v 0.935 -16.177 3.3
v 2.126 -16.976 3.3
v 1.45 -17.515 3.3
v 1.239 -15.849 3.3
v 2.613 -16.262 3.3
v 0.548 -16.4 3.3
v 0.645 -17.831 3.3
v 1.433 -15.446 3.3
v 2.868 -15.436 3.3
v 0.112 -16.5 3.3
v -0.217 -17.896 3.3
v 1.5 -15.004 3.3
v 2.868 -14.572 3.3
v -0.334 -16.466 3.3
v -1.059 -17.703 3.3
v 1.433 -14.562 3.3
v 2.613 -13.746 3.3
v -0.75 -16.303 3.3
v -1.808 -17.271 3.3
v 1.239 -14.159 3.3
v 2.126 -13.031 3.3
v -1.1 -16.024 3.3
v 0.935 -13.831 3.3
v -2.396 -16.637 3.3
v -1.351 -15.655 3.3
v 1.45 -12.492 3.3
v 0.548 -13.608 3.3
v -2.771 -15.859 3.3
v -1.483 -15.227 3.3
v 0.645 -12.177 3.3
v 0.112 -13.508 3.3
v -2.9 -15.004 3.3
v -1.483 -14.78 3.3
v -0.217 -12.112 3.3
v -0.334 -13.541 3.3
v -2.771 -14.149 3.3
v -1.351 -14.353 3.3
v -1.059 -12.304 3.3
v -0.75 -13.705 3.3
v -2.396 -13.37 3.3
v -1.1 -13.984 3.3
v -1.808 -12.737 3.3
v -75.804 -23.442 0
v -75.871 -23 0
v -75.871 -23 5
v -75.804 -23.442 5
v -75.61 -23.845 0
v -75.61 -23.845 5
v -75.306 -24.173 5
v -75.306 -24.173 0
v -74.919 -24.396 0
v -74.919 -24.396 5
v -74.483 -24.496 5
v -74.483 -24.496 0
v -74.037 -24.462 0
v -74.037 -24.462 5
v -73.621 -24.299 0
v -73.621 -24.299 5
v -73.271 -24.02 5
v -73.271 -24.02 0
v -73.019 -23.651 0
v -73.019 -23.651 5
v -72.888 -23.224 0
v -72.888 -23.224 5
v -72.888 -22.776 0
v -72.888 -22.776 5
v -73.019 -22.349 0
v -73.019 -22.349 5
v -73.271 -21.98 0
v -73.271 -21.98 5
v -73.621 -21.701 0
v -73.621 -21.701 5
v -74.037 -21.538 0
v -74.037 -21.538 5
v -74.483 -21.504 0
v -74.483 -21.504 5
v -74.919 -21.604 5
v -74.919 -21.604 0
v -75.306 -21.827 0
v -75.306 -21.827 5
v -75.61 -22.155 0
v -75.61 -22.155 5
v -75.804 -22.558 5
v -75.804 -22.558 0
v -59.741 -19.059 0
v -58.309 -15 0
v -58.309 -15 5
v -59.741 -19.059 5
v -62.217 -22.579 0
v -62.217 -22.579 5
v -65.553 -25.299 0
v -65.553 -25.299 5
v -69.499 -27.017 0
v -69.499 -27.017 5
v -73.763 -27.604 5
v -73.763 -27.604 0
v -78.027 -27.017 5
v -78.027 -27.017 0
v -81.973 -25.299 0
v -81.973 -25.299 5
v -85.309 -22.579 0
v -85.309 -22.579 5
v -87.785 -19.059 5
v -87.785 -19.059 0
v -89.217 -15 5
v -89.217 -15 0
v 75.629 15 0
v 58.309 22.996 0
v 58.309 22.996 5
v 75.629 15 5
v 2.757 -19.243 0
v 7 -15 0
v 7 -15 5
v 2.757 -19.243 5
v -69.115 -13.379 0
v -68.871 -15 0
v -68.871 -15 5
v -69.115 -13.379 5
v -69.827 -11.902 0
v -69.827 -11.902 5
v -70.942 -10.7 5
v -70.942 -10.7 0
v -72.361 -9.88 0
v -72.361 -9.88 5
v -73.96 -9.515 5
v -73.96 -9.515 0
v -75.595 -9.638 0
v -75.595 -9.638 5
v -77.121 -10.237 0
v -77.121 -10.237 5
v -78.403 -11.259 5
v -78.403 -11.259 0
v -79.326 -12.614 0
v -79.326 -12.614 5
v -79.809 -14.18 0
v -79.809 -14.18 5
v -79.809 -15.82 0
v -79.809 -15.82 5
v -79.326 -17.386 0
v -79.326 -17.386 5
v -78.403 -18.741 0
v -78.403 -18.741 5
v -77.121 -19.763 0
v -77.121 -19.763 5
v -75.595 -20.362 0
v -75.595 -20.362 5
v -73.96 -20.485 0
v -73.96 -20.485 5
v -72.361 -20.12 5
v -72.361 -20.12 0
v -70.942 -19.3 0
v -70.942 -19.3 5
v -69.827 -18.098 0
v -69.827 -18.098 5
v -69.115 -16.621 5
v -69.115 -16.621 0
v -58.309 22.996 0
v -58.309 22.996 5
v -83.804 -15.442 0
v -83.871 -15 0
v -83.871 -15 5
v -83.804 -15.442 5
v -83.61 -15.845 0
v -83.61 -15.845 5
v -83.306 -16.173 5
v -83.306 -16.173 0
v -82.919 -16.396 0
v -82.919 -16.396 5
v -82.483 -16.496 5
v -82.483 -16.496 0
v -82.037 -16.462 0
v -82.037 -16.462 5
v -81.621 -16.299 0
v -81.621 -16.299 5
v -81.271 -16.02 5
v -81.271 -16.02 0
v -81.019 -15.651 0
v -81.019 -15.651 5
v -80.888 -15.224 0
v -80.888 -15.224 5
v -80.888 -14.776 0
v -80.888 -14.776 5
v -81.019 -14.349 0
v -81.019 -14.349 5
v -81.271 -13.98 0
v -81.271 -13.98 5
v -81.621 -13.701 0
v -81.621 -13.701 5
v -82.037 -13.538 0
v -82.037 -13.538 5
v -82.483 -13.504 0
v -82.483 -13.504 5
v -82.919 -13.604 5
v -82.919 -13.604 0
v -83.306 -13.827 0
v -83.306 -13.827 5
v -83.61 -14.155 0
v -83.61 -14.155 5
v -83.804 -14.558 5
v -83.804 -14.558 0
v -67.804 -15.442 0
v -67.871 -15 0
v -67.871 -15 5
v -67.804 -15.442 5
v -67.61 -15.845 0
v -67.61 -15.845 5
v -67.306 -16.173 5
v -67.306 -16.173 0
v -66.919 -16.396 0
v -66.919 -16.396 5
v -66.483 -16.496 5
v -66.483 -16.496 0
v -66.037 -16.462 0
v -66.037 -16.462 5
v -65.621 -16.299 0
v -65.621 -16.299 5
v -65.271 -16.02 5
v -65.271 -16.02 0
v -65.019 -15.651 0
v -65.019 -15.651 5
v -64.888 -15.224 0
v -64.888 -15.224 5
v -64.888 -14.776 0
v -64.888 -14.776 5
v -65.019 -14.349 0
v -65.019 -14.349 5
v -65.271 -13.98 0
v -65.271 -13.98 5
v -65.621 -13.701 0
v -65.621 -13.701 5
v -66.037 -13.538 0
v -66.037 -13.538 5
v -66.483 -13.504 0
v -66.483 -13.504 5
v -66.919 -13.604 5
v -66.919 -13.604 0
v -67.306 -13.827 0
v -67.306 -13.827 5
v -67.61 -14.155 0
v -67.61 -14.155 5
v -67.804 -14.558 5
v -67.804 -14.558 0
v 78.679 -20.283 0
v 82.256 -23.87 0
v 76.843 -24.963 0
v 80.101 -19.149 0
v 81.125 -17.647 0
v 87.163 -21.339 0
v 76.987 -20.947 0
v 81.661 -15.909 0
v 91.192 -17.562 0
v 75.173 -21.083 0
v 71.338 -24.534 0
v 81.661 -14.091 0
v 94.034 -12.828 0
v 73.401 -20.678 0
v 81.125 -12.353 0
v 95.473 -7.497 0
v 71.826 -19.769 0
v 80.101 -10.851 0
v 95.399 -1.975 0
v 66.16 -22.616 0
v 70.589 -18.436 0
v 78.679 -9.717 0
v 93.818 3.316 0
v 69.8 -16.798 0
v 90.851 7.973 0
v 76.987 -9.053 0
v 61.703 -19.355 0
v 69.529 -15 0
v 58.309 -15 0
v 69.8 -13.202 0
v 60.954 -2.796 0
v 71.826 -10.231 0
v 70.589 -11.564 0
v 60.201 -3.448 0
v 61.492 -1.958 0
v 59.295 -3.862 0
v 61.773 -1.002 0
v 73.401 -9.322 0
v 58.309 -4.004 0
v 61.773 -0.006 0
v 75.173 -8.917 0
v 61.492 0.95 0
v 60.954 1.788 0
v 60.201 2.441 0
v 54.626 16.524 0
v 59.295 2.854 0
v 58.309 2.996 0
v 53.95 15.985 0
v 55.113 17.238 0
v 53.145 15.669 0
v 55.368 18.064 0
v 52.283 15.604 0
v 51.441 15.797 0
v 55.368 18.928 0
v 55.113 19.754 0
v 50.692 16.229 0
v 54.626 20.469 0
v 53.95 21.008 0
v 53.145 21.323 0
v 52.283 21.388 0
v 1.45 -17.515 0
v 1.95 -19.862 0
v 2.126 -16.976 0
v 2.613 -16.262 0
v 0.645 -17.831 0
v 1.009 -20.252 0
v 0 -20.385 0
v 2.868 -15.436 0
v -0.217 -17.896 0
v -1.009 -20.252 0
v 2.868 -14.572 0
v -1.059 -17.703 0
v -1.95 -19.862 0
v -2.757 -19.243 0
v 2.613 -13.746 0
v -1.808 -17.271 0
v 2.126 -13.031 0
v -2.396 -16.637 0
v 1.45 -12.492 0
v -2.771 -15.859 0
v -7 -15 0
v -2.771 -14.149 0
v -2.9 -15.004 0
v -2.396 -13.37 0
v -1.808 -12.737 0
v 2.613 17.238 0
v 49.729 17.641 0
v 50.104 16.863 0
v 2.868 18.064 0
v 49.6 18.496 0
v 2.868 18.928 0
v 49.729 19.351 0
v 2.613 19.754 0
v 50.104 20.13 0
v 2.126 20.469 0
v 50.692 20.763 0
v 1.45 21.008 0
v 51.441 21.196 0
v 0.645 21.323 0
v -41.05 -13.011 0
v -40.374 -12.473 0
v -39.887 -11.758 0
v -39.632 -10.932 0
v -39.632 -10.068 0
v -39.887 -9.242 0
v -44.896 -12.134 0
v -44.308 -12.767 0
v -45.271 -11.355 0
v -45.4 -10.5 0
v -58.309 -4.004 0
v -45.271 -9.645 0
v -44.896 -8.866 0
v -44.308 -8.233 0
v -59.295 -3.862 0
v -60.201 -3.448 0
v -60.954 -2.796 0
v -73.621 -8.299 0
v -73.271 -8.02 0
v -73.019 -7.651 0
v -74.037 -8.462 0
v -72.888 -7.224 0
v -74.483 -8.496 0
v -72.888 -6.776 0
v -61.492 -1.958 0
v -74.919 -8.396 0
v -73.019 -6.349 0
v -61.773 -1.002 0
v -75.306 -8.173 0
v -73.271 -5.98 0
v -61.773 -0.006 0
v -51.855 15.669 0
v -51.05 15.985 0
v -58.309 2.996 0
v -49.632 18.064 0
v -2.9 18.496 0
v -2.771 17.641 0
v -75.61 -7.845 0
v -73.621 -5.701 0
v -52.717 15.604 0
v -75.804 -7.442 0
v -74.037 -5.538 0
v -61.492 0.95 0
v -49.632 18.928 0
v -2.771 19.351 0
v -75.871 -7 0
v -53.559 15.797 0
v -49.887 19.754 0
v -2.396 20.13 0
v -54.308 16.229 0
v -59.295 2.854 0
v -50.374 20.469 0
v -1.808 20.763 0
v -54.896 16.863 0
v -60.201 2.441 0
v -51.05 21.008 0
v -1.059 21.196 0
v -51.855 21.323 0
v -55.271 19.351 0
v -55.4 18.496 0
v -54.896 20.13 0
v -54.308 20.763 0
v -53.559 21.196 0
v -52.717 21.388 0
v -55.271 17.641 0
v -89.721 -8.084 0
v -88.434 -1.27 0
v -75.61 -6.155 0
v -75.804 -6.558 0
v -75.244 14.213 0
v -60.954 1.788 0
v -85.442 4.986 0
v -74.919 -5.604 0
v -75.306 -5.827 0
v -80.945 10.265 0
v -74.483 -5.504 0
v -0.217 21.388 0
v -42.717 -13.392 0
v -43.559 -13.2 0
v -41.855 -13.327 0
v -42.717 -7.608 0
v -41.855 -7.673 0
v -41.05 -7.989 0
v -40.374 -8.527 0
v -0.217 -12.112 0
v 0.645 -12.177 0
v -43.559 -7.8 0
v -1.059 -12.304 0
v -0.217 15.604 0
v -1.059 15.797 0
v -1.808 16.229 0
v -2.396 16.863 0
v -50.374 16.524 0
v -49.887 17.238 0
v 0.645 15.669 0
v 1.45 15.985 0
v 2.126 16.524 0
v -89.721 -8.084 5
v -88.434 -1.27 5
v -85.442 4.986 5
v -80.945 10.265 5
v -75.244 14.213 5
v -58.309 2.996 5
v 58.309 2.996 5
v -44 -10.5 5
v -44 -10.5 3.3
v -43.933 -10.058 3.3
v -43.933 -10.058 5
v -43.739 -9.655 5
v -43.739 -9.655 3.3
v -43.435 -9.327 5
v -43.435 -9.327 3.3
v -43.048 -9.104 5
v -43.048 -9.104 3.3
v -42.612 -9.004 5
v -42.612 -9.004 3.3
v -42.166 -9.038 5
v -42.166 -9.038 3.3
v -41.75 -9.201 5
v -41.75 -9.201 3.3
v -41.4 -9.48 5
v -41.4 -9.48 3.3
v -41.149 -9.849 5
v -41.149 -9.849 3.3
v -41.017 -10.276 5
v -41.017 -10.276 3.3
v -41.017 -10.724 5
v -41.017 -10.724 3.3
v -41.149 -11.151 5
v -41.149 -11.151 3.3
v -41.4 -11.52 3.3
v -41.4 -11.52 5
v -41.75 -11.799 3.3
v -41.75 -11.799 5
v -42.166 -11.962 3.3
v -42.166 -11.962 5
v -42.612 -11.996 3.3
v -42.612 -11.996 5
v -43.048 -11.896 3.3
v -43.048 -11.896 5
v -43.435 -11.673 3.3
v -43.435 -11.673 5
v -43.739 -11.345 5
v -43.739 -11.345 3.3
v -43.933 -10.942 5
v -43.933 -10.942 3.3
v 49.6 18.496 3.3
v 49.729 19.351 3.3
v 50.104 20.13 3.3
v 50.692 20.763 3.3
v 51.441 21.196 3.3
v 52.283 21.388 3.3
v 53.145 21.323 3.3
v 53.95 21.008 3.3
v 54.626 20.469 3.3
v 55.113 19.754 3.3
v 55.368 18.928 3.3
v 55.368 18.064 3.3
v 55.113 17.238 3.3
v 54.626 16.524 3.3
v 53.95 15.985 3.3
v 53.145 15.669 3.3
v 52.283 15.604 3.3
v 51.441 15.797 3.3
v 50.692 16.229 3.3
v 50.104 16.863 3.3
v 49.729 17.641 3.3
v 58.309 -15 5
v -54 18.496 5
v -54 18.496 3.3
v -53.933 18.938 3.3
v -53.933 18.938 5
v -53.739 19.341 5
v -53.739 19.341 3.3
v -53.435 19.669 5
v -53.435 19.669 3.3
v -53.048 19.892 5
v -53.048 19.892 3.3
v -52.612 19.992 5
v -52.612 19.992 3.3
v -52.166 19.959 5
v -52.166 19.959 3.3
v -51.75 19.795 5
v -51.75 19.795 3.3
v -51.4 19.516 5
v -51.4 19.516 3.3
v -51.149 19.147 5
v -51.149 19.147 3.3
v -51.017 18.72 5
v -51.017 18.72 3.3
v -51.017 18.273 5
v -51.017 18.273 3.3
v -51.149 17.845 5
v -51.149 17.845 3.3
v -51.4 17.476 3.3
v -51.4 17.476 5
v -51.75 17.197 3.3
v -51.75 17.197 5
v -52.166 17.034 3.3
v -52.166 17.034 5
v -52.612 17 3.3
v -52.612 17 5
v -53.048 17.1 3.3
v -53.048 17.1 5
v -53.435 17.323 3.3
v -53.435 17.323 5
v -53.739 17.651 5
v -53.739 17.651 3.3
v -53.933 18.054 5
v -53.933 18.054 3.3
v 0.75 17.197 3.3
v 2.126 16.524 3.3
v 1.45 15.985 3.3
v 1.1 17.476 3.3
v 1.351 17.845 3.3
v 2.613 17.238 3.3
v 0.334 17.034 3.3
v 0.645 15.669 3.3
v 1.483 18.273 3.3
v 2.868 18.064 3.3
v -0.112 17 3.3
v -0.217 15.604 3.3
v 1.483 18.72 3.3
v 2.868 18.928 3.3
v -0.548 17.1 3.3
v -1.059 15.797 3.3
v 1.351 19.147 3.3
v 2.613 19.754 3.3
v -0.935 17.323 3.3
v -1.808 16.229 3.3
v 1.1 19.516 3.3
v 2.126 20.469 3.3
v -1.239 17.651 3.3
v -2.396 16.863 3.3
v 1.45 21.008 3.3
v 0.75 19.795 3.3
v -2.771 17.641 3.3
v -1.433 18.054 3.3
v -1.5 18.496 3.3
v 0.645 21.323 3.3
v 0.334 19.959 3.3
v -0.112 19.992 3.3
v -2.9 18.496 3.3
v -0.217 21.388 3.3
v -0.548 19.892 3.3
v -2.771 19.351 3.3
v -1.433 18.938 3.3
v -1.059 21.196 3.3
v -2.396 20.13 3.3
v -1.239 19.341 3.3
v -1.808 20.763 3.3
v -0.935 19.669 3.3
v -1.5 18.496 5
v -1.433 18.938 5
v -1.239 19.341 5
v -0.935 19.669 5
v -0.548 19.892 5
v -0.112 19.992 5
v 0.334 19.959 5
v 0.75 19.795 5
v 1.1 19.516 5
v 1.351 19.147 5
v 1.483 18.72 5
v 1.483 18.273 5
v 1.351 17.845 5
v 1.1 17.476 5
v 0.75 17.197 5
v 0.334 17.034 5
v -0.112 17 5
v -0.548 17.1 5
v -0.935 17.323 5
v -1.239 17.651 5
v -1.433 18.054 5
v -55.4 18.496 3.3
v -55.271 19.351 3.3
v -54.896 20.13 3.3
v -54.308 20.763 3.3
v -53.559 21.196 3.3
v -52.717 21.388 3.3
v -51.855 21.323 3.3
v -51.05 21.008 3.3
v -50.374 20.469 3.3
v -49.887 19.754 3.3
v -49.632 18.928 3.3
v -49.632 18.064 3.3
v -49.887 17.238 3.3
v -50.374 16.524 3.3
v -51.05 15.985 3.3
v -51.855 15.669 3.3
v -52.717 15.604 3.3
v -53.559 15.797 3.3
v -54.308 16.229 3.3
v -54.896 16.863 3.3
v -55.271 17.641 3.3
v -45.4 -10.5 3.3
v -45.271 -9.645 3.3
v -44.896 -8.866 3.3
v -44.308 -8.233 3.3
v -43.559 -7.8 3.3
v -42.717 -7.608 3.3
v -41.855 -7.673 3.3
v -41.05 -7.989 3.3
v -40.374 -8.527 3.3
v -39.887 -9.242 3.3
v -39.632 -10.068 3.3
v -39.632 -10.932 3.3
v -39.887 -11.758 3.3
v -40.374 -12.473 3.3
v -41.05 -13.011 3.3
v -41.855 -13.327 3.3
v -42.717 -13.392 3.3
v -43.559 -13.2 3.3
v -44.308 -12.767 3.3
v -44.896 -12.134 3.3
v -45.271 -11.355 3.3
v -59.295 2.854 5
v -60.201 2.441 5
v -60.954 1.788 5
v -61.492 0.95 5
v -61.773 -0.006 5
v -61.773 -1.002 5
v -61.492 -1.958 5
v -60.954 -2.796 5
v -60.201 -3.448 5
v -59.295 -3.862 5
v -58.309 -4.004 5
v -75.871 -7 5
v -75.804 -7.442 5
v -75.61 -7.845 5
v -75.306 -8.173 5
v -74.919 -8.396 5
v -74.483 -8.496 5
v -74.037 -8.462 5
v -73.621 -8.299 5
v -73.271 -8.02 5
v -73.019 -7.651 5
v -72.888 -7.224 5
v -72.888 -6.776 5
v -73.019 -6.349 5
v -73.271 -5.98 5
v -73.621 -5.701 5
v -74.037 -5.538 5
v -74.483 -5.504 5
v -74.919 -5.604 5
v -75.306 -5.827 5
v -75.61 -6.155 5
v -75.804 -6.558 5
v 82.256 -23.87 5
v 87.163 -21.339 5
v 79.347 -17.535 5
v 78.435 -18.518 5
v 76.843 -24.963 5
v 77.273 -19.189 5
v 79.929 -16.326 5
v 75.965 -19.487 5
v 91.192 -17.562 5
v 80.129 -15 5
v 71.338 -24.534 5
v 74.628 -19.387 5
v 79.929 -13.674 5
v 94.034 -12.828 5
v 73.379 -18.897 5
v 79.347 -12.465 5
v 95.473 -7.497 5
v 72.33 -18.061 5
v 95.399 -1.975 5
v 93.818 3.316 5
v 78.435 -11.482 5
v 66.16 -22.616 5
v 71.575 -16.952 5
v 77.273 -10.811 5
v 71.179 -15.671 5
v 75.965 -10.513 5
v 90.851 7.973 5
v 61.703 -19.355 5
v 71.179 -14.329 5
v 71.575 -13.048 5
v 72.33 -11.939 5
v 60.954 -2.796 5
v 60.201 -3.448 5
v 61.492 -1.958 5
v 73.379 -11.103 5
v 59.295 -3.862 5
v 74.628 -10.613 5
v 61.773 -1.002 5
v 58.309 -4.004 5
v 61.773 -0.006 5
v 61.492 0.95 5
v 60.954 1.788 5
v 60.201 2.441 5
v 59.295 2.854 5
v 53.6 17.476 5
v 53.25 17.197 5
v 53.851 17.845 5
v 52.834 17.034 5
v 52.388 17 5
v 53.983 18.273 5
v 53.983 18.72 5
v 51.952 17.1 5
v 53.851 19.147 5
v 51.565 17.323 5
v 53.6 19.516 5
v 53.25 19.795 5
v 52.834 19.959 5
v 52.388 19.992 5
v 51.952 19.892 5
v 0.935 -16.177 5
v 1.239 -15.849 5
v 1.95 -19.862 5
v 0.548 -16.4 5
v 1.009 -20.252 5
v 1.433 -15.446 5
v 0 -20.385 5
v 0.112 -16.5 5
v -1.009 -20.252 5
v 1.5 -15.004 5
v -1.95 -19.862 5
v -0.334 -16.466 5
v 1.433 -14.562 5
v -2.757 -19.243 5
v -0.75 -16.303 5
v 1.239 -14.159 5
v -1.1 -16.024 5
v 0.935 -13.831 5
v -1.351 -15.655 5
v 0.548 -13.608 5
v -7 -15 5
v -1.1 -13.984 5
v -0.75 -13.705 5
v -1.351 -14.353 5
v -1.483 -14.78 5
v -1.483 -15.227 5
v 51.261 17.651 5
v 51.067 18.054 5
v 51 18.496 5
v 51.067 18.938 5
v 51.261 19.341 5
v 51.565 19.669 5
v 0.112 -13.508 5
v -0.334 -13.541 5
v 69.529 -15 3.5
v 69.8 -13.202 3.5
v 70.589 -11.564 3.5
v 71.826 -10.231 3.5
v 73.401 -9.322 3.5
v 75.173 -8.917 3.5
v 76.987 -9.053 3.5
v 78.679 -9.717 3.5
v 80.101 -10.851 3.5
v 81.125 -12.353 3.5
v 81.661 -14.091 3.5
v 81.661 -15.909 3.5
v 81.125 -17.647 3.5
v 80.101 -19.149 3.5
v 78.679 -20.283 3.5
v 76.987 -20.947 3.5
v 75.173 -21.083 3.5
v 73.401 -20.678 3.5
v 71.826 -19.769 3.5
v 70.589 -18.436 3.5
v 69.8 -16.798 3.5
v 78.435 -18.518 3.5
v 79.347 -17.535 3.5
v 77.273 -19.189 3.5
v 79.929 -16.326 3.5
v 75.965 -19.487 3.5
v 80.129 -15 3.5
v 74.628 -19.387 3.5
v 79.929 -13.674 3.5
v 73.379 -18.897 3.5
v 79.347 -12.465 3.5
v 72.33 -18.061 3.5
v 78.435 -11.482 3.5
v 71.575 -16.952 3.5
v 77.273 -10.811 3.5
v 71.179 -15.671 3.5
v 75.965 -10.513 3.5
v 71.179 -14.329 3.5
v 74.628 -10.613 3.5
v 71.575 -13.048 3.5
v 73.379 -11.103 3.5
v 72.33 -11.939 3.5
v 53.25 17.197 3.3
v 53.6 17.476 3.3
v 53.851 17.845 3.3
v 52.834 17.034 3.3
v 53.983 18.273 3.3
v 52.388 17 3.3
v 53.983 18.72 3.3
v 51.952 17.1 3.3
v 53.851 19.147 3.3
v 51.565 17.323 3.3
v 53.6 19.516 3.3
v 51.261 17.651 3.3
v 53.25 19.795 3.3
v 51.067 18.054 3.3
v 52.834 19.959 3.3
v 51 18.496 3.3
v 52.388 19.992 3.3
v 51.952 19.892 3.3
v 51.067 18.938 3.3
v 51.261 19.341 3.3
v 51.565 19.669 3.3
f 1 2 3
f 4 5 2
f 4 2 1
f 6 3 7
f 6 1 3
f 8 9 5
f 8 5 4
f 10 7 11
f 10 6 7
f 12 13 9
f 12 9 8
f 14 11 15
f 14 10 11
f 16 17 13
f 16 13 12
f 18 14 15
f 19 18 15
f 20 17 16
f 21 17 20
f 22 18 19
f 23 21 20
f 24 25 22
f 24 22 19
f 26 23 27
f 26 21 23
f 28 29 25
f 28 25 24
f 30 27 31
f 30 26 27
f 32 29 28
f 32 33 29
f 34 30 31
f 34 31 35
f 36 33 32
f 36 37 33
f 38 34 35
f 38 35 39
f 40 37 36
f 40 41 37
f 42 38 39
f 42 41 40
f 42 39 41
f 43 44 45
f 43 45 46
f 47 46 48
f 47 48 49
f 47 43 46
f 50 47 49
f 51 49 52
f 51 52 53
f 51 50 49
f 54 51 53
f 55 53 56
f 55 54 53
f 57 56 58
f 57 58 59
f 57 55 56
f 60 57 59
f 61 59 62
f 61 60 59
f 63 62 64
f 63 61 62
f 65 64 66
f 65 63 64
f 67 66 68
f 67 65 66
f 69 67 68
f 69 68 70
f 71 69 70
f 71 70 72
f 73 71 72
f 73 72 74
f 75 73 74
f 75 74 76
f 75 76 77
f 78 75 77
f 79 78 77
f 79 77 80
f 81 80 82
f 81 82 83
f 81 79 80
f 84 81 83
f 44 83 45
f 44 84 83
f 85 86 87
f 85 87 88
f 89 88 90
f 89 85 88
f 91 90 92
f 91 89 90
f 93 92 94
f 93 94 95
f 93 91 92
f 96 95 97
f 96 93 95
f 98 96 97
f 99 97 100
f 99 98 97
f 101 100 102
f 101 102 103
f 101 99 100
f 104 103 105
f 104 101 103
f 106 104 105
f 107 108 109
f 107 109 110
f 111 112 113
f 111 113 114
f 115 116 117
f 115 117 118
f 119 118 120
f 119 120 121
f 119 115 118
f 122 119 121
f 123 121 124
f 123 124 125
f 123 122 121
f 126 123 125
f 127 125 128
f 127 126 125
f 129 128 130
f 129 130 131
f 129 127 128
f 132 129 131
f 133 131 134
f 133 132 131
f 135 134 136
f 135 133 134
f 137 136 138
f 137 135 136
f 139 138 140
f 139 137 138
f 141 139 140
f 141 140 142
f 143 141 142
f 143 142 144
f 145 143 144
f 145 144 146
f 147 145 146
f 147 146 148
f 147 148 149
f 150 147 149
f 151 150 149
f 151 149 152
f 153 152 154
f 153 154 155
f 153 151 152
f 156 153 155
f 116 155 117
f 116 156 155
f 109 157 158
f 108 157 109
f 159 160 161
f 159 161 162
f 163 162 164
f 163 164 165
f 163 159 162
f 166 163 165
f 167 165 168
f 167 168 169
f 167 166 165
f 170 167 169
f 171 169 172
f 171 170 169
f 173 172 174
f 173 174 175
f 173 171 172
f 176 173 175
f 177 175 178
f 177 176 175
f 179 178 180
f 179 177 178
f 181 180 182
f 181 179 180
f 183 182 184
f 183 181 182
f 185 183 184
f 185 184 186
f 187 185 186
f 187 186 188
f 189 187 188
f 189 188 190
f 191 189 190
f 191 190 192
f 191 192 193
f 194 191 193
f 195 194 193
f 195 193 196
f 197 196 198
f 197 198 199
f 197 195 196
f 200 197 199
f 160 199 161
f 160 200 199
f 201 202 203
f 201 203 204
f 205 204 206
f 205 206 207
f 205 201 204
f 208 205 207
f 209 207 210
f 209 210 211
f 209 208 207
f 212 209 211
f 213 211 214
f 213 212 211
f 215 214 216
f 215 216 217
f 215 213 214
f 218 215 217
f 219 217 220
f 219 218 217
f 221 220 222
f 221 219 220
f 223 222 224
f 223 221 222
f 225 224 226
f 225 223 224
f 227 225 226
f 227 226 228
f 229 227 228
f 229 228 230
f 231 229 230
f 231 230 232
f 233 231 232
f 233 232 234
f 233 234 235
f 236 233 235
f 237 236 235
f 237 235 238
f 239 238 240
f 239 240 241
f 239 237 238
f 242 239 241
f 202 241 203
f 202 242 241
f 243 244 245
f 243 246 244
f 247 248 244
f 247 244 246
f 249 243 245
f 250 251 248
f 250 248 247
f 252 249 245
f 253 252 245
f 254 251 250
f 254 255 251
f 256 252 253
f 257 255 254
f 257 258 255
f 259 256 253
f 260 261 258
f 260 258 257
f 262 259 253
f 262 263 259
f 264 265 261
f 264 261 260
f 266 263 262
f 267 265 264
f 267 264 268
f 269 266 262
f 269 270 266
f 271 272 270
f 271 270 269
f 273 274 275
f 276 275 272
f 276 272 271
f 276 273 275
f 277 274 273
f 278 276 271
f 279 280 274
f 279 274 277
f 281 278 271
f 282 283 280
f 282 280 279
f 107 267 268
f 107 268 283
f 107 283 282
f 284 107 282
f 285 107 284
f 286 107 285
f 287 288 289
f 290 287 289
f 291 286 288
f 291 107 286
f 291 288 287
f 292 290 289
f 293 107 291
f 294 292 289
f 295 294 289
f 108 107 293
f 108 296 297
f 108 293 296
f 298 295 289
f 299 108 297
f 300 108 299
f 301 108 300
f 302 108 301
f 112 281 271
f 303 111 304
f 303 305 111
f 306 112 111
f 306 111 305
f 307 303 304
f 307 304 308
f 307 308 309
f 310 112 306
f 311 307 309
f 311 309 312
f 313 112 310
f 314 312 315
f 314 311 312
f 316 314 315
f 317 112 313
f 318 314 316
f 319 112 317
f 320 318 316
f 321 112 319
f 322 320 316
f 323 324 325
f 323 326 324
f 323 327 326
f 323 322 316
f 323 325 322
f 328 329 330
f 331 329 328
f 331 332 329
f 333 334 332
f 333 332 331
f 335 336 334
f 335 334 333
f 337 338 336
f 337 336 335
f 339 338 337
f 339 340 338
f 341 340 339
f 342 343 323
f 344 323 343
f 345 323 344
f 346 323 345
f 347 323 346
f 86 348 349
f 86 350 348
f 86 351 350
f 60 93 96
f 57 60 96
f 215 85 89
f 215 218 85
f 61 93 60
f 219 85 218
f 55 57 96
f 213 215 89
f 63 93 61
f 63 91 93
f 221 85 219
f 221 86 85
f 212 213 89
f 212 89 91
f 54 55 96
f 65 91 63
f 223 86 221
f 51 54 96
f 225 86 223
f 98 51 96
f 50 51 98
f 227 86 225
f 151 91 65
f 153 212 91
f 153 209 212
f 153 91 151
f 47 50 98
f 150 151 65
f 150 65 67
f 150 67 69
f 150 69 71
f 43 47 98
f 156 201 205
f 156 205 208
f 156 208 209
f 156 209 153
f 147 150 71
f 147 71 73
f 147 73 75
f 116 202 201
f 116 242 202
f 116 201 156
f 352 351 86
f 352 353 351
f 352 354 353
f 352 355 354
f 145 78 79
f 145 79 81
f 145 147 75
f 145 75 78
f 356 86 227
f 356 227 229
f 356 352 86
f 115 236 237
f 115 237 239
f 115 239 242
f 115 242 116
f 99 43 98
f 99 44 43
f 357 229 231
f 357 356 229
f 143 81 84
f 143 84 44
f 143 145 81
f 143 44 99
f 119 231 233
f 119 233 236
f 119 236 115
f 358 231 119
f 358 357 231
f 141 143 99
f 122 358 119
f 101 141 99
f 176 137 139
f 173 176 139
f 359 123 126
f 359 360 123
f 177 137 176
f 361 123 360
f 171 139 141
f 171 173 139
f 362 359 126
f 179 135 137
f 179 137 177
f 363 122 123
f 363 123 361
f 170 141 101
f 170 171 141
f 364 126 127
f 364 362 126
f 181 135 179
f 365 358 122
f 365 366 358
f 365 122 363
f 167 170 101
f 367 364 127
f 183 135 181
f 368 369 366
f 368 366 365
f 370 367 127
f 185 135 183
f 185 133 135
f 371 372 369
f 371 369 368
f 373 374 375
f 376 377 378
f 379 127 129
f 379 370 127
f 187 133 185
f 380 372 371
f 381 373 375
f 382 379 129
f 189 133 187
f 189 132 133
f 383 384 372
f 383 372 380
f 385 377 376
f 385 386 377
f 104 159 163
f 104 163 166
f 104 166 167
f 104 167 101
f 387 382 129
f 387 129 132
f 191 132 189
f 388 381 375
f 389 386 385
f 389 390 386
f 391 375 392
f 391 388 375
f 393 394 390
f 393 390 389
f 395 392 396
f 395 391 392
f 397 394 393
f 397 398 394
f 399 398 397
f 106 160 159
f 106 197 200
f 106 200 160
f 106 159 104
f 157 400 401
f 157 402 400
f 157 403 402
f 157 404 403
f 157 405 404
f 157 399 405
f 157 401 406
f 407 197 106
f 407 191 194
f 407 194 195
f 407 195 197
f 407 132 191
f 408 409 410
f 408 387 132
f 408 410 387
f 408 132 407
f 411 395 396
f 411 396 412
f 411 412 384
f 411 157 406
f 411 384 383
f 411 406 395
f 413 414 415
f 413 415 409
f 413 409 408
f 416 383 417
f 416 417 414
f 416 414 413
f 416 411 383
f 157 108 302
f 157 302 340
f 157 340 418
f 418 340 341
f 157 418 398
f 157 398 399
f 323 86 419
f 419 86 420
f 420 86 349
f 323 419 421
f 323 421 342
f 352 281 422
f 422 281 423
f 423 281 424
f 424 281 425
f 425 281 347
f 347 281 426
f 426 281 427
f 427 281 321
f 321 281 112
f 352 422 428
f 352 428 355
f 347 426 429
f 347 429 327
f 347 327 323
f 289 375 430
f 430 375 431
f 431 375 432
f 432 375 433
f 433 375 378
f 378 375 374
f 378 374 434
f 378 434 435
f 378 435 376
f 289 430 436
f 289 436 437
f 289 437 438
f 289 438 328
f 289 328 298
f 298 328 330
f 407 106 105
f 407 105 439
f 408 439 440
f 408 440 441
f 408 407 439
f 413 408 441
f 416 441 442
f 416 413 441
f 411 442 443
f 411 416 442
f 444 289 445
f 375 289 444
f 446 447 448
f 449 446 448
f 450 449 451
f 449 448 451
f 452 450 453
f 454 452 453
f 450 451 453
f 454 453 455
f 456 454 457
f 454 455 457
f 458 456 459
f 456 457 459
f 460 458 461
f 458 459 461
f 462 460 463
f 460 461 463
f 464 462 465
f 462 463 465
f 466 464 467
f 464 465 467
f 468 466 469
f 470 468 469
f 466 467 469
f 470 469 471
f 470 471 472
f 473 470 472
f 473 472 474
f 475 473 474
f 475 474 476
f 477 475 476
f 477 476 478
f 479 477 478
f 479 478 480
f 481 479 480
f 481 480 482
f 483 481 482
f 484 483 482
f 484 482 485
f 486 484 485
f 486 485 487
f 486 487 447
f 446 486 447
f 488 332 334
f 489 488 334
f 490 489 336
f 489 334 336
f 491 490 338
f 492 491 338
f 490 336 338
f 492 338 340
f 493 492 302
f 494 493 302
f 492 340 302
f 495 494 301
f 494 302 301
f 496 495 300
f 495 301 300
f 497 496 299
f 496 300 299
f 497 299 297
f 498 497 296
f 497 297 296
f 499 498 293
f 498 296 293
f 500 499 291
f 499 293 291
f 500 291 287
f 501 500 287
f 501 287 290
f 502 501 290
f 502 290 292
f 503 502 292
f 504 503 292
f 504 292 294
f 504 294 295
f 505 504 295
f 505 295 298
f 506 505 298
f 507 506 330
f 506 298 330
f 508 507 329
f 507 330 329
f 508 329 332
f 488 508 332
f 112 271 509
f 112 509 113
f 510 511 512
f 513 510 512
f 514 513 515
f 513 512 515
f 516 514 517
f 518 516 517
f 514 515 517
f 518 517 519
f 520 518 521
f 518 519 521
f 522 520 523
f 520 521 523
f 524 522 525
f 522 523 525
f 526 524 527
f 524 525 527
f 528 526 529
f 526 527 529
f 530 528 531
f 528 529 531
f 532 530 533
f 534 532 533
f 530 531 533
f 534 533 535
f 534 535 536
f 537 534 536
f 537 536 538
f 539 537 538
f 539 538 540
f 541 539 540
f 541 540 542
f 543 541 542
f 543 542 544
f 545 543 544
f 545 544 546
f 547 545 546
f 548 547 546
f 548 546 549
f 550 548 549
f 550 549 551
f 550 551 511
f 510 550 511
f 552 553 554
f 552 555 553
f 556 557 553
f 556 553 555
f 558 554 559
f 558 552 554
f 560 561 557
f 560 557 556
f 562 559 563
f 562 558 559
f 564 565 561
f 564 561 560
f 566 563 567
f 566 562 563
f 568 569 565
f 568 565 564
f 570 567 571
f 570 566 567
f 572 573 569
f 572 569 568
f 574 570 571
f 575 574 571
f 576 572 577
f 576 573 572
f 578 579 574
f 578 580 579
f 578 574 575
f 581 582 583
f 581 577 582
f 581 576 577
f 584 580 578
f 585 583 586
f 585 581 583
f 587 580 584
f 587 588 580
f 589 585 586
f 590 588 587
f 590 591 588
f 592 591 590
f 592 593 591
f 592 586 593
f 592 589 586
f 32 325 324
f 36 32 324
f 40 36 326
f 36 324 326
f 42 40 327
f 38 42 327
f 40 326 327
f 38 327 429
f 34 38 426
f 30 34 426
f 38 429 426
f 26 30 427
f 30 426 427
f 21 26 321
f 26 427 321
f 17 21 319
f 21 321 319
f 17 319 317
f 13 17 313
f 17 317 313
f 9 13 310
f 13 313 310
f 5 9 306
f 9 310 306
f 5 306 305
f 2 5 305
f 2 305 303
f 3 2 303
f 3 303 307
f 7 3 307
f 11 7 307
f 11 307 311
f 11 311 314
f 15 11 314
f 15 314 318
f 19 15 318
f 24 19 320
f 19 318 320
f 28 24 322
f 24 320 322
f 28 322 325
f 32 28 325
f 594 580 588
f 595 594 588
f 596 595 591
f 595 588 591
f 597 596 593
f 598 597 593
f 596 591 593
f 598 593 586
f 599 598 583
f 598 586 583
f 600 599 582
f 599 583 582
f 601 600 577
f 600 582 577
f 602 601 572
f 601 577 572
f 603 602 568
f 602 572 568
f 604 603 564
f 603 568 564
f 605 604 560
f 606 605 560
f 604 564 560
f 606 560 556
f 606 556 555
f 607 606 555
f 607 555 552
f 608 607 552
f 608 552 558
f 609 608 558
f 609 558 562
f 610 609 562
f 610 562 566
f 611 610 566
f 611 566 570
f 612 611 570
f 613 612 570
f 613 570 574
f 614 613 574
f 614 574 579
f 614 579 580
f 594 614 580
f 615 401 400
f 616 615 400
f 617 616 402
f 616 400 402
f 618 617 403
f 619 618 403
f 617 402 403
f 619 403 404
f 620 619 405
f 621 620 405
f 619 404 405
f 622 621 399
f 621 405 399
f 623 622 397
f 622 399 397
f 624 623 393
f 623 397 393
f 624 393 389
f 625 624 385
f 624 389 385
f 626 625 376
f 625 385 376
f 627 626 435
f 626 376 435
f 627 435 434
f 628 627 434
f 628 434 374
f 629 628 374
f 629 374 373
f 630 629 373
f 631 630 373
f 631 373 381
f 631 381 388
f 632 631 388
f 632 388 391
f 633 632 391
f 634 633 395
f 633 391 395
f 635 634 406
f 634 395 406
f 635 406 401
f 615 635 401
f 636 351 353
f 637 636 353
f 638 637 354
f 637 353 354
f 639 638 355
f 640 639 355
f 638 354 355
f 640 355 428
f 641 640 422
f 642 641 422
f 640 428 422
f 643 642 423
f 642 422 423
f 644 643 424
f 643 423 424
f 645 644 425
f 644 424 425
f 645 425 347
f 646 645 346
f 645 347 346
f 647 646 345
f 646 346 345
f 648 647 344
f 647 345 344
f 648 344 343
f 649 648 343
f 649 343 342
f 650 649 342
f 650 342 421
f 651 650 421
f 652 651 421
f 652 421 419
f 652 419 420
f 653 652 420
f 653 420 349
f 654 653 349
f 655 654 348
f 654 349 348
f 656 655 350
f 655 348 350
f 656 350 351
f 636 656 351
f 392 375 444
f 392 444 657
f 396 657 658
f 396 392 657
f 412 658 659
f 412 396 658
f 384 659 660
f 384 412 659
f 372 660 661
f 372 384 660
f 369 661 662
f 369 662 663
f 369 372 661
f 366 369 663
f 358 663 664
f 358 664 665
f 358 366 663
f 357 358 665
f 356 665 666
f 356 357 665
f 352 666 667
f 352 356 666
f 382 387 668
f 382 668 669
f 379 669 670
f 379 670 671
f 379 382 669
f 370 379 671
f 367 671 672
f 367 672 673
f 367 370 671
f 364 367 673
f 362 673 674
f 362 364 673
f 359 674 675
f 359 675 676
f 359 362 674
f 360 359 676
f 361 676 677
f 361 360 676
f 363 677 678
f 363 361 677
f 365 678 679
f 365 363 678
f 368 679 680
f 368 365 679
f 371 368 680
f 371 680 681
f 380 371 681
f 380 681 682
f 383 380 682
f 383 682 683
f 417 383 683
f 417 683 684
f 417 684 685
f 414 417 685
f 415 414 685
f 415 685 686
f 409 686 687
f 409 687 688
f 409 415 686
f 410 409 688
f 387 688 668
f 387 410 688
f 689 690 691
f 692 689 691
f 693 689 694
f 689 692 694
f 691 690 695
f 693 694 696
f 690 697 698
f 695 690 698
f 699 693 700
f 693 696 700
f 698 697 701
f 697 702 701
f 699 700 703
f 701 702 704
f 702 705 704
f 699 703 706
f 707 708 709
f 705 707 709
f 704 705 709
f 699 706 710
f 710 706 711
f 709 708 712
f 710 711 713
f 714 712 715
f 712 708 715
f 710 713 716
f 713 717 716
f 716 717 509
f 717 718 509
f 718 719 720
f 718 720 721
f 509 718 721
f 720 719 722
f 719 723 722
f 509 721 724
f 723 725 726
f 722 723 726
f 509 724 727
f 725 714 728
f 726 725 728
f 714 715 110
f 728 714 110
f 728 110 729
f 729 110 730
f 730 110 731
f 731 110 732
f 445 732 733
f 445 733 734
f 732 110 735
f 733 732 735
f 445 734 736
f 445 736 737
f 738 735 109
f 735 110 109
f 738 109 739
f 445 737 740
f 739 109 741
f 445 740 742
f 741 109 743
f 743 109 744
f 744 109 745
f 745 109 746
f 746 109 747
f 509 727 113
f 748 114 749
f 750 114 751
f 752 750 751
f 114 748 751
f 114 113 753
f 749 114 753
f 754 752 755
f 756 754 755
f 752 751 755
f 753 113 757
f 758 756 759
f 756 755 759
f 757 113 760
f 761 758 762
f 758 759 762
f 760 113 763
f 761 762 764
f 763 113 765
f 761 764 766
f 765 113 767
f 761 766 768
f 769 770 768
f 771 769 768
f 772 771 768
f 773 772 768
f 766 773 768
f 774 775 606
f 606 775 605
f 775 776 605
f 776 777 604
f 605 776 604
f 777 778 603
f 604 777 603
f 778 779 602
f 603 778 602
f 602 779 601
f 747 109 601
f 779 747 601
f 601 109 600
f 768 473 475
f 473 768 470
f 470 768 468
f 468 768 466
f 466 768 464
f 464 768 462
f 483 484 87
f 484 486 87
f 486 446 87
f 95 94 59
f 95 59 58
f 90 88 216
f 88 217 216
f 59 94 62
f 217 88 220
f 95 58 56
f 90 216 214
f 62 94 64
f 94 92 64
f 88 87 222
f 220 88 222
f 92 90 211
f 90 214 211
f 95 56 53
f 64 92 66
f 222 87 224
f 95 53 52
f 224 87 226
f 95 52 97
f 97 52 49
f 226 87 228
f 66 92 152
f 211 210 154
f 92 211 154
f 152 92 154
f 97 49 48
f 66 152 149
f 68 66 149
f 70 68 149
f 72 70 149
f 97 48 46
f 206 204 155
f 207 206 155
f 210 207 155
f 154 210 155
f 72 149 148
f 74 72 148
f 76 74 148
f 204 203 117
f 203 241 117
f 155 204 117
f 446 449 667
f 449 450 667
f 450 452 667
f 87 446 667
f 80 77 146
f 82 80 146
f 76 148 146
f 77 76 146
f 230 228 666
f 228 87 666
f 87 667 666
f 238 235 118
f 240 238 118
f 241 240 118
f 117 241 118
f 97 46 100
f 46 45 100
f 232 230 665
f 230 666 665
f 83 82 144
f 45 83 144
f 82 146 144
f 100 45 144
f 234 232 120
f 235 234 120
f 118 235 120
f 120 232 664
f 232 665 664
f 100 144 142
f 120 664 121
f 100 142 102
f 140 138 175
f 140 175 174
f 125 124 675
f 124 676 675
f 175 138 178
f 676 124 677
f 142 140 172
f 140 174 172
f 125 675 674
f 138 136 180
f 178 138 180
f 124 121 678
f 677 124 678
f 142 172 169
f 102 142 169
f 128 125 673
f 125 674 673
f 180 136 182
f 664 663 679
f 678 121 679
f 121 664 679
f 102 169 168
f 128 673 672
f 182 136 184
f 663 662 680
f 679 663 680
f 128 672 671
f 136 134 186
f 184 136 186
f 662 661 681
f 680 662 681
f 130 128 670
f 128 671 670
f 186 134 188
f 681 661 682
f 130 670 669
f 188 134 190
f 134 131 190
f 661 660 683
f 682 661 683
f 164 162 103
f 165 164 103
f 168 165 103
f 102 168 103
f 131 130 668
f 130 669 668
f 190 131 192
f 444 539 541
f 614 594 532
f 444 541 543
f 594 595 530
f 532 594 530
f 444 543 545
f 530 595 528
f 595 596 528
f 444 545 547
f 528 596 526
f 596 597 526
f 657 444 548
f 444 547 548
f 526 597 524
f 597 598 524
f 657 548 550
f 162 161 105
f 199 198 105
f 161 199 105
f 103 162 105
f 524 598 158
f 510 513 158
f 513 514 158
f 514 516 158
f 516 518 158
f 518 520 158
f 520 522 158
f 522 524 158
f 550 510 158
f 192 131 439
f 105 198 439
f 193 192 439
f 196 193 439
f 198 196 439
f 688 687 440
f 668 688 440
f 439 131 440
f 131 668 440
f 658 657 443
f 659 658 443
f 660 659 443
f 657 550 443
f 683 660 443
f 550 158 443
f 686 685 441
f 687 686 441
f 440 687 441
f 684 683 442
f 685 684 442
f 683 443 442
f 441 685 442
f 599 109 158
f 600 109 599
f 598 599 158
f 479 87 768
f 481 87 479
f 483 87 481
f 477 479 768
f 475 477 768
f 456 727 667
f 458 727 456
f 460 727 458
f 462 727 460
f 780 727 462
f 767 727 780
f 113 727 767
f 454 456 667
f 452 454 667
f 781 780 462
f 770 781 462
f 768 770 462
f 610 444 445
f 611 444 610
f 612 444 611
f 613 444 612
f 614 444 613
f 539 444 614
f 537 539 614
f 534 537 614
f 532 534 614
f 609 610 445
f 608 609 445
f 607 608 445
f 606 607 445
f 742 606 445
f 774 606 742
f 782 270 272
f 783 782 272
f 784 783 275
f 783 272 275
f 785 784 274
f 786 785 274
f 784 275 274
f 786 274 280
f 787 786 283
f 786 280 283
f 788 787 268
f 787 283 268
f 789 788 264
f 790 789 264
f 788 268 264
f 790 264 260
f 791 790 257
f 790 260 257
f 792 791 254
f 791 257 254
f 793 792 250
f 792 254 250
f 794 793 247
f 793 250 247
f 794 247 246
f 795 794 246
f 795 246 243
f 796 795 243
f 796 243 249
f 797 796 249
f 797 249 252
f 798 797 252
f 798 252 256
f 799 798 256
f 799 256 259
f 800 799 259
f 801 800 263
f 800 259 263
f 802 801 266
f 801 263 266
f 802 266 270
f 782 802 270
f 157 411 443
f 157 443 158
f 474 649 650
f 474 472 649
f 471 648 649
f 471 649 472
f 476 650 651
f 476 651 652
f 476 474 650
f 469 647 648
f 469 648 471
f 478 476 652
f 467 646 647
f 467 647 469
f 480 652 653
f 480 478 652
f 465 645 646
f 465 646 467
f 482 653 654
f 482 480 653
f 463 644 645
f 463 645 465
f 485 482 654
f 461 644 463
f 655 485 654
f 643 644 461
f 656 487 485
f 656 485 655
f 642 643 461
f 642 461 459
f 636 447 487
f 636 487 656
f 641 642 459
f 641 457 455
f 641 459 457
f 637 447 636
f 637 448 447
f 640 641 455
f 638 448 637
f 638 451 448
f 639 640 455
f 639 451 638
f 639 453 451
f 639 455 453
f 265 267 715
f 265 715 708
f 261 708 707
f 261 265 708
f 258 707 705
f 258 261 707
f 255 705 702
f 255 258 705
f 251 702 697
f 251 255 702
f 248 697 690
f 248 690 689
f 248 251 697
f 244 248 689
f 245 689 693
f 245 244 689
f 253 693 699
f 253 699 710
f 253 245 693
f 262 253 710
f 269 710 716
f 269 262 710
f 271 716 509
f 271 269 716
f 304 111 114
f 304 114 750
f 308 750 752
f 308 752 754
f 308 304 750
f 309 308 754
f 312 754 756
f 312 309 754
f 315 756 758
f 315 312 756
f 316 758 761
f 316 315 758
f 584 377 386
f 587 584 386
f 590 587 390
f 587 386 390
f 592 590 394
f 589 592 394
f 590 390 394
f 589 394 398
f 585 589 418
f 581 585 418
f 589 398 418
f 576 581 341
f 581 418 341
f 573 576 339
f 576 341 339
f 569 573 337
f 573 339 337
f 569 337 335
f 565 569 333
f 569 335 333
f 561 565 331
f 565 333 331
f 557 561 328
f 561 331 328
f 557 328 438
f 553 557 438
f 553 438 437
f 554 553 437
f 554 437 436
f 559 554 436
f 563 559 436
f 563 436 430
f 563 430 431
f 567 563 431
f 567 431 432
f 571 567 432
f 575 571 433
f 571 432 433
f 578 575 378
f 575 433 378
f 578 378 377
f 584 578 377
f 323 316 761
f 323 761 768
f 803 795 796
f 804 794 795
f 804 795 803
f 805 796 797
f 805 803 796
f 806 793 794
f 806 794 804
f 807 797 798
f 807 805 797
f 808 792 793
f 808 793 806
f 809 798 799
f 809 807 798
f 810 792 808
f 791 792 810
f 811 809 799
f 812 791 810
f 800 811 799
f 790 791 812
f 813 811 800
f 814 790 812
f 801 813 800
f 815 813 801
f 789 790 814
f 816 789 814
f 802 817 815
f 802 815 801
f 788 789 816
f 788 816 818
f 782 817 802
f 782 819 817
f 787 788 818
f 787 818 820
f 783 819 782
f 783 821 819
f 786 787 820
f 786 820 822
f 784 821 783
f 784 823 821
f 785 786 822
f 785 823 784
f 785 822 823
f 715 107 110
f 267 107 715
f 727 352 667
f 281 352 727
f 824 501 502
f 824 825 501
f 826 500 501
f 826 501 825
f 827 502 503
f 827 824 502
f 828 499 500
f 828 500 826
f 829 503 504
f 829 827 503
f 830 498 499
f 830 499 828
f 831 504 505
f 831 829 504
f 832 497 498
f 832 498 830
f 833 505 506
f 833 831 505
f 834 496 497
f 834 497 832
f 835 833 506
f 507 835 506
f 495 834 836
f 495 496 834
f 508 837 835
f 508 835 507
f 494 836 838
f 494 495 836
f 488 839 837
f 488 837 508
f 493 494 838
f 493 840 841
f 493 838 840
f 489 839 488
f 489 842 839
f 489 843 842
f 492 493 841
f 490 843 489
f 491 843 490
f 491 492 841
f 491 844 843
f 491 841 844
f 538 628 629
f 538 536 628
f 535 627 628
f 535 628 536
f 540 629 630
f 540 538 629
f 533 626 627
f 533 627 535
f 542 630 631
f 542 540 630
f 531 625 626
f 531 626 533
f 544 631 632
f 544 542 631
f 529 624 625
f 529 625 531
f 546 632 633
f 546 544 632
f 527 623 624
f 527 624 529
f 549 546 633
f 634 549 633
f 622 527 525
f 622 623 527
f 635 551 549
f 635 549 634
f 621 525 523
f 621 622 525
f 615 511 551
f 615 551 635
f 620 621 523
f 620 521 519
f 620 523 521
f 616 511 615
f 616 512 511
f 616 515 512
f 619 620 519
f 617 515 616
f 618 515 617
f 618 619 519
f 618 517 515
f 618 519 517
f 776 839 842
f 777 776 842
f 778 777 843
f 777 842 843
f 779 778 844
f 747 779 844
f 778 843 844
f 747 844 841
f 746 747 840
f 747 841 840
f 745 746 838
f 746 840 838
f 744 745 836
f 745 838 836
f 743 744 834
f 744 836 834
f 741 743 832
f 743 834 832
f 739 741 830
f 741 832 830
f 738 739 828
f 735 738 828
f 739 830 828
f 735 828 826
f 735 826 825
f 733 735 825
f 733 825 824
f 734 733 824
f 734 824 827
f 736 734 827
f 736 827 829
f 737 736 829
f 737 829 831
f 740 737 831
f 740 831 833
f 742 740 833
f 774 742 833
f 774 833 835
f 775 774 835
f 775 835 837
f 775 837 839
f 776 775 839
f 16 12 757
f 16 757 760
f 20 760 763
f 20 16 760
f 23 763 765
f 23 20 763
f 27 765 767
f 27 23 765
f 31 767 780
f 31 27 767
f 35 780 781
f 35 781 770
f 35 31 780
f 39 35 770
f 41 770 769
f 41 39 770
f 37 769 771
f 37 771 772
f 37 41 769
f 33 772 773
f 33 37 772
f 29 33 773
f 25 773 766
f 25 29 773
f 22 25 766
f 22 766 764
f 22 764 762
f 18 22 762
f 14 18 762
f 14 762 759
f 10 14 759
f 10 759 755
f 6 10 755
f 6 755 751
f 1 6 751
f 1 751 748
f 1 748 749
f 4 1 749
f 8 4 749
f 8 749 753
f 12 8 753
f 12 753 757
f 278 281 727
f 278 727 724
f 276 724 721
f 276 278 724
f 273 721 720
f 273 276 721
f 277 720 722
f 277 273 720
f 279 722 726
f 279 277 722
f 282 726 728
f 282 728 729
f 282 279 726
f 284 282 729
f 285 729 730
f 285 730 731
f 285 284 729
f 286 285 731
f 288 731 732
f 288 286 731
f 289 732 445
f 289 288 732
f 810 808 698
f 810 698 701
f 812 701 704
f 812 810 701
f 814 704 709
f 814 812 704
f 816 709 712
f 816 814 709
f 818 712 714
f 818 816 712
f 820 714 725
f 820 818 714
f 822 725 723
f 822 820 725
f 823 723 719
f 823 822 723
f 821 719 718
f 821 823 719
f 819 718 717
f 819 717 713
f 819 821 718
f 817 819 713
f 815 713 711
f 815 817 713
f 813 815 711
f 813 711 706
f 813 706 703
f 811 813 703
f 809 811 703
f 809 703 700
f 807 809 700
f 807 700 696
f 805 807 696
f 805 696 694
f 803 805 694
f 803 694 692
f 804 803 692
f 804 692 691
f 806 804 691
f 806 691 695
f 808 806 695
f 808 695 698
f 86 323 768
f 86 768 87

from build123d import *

# Parameters (mm, degrees)
SKETCH1_R           = 5.5
SKETCH1_R_2         = 1.5
SKETCH1_R_3         = 4.5
BOSS_EXTRUDE1_DEPTH = 5
SKETCH4_R           = 6.1
CUT_EXTRUDE1_DEPTH  = 3.5
SKETCH5_R           = 1.5
CUT_EXTRUDE2_DEPTH  = 5
SKETCH6_R           = 1.5
CUT_EXTRUDE3_DEPTH  = 10
SKETCH7_R           = 2.9
CUT_EXTRUDE4_DEPTH  = 3.3


with BuildPart() as part:
    # Sketch1 → Boss-Extrude1 (new body)
    with BuildSketch(Plane.XY):
        with BuildLine():
            Line((-58.308676511, 22.996128985), (58.308676511, 22.996128985))
            Line((58.308676511, 22.996128985), (75.629184587, 15))
            Line((75.629184587, 15), (90.85122644, 7.972642053))
            ThreePointArc((90.85122644, 7.972642053), (87.163327852, -21.339018917), (58.308676511, -15))
            Line((58.308676511, -15), (7, -15))
            Line((7, -15), (2.757359313, -19.242640687))
            ThreePointArc((2.757359313, -19.242640687), (0, -20.384776311), (-2.757359313, -19.242640687))
            Line((-2.757359313, -19.242640687), (-7, -15))
            Line((-7, -15), (-58.308676511, -15))
            ThreePointArc((-58.308676511, -15), (-73.76298075, -27.603590324), (-89.217284989, -15))
            ThreePointArc((-89.217284989, -15), (-87.141316573, 1.955509585), (-75.243665272, 14.212949924))
            Line((-75.243665272, 14.212949924), (-58.308676511, 22.996128985))
        make_face()
        with Locations((-74.370815413, -15)):
            Circle(SKETCH1_R, mode=Mode.SUBTRACT)
        with Locations(Location((-74.370815413, -7, 0), (0, 0, 180))):
            Circle(SKETCH1_R_2, mode=Mode.SUBTRACT)
        with Locations((75.629184587, -15)):
            Circle(SKETCH1_R_3, mode=Mode.SUBTRACT)
        with Locations((0, -15.003871015)):
            Circle(SKETCH1_R_2, mode=Mode.SUBTRACT)
        with Locations(Location((-66.370815413, -15, 0), (0, 0, 180))):
            Circle(SKETCH1_R_2, mode=Mode.SUBTRACT)
        with Locations(Location((-74.370815413, -23, 0), (0, 0, 180))):
            Circle(SKETCH1_R_2, mode=Mode.SUBTRACT)
        with Locations(Location((-82.370815413, -15, 0), (0, 0, 180))):
            Circle(SKETCH1_R_2, mode=Mode.SUBTRACT)
        with BuildLine():
            Line((-58.308676511, -4.003871015), (58.308676511, -4.003871015))
            ThreePointArc((58.308676511, -4.003871015), (61.808676511, -0.503871015), (58.308676511, 2.996128985))
            Line((58.308676511, 2.996128985), (-58.308676511, 2.996128985))
            ThreePointArc((-58.308676511, 2.996128985), (-61.808676511, -0.503871015), (-58.308676511, -4.003871015))
        make_face(mode=Mode.SUBTRACT)
    extrude(amount=BOSS_EXTRUDE1_DEPTH)

    # Sketch4 → Cut-Extrude1 (cut)
    with BuildSketch(Plane(origin=(0, 0, 0), x_dir=(-1, 0, 0), z_dir=(0, 0, -1))):
        with Locations((-75.629184587, -15)):
            Circle(SKETCH4_R)
    extrude(amount=-CUT_EXTRUDE1_DEPTH, mode=Mode.SUBTRACT)

    # Sketch5 → Cut-Extrude2 (cut)
    with BuildSketch(Plane(origin=(0, 0, 0), x_dir=(-1, 0, 0), z_dir=(0, 0, -1))):
        with Locations((0, 18.496128985)):
            Circle(SKETCH5_R)
        with Locations((52.5, 18.496128985)):
            Circle(SKETCH5_R)
        with Locations((-52.5, 18.496128985)):
            Circle(SKETCH5_R)
    extrude(amount=-CUT_EXTRUDE2_DEPTH, mode=Mode.SUBTRACT)

    # Sketch6 → Cut-Extrude3 (cut)
    with BuildSketch(Plane(origin=(0, 0, 0), x_dir=(-1, 0, 0), z_dir=(0, 0, -1))):
        with Locations((42.5, -10.5)):
            Circle(SKETCH6_R)
    extrude(amount=-CUT_EXTRUDE3_DEPTH, mode=Mode.SUBTRACT)

    # Sketch7 → Cut-Extrude4 (cut)
    with BuildSketch(Plane(origin=(0, 0, 0), x_dir=(-1, 0, 0), z_dir=(0, 0, -1))):
        with Locations((42.5, -10.5)):
            Circle(SKETCH7_R)
        with Locations((0, -15.003871015)):
            Circle(SKETCH7_R)
        with Locations((0, 18.496128985)):
            Circle(SKETCH7_R)
        with Locations((52.5, 18.496128985)):
            Circle(SKETCH7_R)
        with Locations((-52.5, 18.496128985)):
            Circle(SKETCH7_R)
    extrude(amount=-CUT_EXTRUDE4_DEPTH, mode=Mode.SUBTRACT)


solid = part.part
